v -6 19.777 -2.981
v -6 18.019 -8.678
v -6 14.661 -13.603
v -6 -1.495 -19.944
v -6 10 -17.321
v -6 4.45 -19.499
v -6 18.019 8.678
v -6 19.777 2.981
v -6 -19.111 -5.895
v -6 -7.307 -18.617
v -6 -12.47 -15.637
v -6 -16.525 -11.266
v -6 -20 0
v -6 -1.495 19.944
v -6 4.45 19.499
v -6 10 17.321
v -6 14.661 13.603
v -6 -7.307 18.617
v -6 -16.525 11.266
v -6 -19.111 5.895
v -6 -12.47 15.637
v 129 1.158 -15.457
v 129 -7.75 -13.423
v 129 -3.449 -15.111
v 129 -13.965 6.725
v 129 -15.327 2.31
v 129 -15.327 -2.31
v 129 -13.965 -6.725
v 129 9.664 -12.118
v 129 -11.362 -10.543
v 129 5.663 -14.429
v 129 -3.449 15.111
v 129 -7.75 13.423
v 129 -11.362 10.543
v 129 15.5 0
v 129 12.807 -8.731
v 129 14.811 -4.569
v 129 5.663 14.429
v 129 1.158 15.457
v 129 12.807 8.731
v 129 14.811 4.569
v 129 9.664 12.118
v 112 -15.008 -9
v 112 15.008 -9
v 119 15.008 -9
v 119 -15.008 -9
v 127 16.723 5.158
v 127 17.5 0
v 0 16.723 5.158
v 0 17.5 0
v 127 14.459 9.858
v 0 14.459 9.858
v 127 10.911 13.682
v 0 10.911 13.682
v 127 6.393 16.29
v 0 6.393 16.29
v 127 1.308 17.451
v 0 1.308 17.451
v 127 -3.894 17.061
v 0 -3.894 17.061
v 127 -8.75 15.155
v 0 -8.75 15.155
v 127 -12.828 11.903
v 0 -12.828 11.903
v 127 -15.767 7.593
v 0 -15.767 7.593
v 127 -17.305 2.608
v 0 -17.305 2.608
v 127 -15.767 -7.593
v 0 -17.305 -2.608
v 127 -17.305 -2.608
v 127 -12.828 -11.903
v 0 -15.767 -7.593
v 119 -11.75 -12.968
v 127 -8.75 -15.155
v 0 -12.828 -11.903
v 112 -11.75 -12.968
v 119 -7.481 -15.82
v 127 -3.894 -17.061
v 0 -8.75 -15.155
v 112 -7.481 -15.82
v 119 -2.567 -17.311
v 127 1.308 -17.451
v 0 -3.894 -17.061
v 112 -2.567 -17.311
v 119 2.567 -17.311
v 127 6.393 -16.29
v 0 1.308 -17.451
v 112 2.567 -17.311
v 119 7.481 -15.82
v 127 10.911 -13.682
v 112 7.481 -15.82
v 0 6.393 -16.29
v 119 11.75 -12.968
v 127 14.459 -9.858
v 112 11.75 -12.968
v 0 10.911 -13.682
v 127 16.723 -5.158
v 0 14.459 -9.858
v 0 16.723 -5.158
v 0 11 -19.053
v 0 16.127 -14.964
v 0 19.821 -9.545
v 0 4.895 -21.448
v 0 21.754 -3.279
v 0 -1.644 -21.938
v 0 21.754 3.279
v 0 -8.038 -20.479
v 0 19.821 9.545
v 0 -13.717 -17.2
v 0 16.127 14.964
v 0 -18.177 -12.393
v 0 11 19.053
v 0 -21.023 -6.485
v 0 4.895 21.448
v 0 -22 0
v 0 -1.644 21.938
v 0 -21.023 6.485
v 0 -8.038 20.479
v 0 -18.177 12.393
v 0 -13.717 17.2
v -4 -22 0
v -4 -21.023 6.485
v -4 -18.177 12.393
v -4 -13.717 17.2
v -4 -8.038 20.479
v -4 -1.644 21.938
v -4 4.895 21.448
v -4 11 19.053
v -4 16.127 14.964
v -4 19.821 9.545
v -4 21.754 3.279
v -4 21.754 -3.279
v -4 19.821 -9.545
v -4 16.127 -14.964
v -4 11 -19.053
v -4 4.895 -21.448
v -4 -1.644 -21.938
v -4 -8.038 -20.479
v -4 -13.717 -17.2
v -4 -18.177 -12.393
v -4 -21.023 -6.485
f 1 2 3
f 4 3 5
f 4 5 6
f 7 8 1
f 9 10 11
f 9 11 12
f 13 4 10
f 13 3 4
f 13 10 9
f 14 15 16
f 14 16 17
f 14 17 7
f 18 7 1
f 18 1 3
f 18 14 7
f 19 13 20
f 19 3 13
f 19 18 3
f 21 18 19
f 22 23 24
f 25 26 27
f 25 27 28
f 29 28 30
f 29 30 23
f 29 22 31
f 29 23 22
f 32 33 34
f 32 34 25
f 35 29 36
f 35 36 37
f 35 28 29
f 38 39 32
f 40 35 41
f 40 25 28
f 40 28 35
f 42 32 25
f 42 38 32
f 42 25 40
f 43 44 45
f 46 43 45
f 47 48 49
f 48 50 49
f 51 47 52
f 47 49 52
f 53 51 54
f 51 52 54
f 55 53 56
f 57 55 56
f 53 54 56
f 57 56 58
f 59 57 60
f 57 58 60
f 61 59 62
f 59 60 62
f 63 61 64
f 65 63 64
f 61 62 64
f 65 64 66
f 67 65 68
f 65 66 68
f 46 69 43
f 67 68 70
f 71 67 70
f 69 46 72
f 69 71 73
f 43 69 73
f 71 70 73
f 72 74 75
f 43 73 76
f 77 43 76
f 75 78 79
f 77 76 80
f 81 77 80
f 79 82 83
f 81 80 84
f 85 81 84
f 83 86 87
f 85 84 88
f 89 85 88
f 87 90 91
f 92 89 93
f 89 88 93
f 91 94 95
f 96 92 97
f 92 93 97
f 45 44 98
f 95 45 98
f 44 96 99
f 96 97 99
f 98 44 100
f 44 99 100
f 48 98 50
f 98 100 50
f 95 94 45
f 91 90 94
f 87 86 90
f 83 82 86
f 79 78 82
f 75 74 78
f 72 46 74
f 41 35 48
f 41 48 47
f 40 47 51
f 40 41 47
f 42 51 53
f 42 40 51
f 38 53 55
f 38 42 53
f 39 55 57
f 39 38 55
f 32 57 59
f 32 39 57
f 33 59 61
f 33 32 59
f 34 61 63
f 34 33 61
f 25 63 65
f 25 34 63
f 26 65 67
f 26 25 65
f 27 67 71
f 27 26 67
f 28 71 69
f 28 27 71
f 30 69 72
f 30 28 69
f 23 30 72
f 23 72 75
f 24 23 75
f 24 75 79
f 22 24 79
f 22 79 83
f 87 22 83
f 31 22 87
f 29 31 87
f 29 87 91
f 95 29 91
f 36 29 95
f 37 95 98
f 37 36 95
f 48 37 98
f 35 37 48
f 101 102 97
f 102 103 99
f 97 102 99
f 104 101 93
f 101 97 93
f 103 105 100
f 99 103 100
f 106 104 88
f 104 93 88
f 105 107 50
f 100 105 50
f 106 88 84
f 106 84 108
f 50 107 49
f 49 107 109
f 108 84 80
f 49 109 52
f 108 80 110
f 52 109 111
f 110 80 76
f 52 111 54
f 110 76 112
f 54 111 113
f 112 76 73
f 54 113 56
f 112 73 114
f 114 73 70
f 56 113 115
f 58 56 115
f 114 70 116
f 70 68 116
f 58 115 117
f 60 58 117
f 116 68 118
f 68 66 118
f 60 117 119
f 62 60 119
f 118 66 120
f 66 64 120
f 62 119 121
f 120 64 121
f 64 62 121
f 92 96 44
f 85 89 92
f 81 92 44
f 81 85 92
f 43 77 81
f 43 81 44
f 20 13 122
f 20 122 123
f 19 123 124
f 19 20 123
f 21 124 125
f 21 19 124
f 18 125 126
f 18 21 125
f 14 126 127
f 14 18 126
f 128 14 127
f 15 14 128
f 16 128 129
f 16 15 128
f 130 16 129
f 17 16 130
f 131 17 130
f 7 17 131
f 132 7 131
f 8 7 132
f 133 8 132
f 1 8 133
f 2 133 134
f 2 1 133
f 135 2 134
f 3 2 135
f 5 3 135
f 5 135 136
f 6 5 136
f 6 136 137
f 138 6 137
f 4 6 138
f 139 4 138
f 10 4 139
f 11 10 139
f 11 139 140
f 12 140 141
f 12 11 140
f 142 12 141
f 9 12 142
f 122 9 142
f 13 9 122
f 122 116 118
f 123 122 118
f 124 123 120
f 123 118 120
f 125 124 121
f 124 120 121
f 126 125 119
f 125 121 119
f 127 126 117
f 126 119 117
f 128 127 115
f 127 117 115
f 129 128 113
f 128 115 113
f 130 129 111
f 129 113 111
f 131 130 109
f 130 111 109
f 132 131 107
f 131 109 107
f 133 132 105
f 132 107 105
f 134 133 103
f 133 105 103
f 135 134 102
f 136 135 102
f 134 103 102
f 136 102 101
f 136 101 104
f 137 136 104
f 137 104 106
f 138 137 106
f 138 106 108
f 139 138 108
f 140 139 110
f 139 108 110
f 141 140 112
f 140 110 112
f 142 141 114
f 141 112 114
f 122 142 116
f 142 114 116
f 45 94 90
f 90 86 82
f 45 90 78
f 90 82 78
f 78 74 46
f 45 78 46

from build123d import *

# Parameters (mm, degrees)
F0_R     = 17.5
F1_DEPTH = 129
F2_SIZE  = 2
F3_R     = 22
F4_DEPTH = 6
F5_SIZE  = 2
F6_W     = 7
F6_H     = 17.894253
F7_DEPTH = 25


with BuildPart() as f1:
    # F0 (on Right) → F1 (new body)
    with BuildSketch(Plane.YZ):
        Circle(F0_R)
    extrude(amount=F1_DEPTH)

    # F2
    f2_edges = [f1.edges().sort_by_distance(p)[0] for p in [
        (129, -17.5, 0),
    ]]
    chamfer(f2_edges, length=F2_SIZE)

    # F3 (on face) → F4 (join)
    with BuildSketch(Plane(origin=(0, 0, 0), x_dir=(0, -1, 0), z_dir=(-1, 0, 0))):
        Circle(F3_R)
    extrude(amount=F4_DEPTH)

    # F5
    f5_edges = [f1.edges().sort_by_distance(p)[0] for p in [
        (-6, 22, 0),
    ]]
    chamfer(f5_edges, length=F5_SIZE)

    # F6 (on Front) → F7 (cut, symmetric)
    with BuildSketch(Plane.XZ):
        with Locations((115.5, -17.947126)):
            Rectangle(F6_W, F6_H)
    extrude(amount=F7_DEPTH, both=True, mode=Mode.SUBTRACT)


solid = f1.part
